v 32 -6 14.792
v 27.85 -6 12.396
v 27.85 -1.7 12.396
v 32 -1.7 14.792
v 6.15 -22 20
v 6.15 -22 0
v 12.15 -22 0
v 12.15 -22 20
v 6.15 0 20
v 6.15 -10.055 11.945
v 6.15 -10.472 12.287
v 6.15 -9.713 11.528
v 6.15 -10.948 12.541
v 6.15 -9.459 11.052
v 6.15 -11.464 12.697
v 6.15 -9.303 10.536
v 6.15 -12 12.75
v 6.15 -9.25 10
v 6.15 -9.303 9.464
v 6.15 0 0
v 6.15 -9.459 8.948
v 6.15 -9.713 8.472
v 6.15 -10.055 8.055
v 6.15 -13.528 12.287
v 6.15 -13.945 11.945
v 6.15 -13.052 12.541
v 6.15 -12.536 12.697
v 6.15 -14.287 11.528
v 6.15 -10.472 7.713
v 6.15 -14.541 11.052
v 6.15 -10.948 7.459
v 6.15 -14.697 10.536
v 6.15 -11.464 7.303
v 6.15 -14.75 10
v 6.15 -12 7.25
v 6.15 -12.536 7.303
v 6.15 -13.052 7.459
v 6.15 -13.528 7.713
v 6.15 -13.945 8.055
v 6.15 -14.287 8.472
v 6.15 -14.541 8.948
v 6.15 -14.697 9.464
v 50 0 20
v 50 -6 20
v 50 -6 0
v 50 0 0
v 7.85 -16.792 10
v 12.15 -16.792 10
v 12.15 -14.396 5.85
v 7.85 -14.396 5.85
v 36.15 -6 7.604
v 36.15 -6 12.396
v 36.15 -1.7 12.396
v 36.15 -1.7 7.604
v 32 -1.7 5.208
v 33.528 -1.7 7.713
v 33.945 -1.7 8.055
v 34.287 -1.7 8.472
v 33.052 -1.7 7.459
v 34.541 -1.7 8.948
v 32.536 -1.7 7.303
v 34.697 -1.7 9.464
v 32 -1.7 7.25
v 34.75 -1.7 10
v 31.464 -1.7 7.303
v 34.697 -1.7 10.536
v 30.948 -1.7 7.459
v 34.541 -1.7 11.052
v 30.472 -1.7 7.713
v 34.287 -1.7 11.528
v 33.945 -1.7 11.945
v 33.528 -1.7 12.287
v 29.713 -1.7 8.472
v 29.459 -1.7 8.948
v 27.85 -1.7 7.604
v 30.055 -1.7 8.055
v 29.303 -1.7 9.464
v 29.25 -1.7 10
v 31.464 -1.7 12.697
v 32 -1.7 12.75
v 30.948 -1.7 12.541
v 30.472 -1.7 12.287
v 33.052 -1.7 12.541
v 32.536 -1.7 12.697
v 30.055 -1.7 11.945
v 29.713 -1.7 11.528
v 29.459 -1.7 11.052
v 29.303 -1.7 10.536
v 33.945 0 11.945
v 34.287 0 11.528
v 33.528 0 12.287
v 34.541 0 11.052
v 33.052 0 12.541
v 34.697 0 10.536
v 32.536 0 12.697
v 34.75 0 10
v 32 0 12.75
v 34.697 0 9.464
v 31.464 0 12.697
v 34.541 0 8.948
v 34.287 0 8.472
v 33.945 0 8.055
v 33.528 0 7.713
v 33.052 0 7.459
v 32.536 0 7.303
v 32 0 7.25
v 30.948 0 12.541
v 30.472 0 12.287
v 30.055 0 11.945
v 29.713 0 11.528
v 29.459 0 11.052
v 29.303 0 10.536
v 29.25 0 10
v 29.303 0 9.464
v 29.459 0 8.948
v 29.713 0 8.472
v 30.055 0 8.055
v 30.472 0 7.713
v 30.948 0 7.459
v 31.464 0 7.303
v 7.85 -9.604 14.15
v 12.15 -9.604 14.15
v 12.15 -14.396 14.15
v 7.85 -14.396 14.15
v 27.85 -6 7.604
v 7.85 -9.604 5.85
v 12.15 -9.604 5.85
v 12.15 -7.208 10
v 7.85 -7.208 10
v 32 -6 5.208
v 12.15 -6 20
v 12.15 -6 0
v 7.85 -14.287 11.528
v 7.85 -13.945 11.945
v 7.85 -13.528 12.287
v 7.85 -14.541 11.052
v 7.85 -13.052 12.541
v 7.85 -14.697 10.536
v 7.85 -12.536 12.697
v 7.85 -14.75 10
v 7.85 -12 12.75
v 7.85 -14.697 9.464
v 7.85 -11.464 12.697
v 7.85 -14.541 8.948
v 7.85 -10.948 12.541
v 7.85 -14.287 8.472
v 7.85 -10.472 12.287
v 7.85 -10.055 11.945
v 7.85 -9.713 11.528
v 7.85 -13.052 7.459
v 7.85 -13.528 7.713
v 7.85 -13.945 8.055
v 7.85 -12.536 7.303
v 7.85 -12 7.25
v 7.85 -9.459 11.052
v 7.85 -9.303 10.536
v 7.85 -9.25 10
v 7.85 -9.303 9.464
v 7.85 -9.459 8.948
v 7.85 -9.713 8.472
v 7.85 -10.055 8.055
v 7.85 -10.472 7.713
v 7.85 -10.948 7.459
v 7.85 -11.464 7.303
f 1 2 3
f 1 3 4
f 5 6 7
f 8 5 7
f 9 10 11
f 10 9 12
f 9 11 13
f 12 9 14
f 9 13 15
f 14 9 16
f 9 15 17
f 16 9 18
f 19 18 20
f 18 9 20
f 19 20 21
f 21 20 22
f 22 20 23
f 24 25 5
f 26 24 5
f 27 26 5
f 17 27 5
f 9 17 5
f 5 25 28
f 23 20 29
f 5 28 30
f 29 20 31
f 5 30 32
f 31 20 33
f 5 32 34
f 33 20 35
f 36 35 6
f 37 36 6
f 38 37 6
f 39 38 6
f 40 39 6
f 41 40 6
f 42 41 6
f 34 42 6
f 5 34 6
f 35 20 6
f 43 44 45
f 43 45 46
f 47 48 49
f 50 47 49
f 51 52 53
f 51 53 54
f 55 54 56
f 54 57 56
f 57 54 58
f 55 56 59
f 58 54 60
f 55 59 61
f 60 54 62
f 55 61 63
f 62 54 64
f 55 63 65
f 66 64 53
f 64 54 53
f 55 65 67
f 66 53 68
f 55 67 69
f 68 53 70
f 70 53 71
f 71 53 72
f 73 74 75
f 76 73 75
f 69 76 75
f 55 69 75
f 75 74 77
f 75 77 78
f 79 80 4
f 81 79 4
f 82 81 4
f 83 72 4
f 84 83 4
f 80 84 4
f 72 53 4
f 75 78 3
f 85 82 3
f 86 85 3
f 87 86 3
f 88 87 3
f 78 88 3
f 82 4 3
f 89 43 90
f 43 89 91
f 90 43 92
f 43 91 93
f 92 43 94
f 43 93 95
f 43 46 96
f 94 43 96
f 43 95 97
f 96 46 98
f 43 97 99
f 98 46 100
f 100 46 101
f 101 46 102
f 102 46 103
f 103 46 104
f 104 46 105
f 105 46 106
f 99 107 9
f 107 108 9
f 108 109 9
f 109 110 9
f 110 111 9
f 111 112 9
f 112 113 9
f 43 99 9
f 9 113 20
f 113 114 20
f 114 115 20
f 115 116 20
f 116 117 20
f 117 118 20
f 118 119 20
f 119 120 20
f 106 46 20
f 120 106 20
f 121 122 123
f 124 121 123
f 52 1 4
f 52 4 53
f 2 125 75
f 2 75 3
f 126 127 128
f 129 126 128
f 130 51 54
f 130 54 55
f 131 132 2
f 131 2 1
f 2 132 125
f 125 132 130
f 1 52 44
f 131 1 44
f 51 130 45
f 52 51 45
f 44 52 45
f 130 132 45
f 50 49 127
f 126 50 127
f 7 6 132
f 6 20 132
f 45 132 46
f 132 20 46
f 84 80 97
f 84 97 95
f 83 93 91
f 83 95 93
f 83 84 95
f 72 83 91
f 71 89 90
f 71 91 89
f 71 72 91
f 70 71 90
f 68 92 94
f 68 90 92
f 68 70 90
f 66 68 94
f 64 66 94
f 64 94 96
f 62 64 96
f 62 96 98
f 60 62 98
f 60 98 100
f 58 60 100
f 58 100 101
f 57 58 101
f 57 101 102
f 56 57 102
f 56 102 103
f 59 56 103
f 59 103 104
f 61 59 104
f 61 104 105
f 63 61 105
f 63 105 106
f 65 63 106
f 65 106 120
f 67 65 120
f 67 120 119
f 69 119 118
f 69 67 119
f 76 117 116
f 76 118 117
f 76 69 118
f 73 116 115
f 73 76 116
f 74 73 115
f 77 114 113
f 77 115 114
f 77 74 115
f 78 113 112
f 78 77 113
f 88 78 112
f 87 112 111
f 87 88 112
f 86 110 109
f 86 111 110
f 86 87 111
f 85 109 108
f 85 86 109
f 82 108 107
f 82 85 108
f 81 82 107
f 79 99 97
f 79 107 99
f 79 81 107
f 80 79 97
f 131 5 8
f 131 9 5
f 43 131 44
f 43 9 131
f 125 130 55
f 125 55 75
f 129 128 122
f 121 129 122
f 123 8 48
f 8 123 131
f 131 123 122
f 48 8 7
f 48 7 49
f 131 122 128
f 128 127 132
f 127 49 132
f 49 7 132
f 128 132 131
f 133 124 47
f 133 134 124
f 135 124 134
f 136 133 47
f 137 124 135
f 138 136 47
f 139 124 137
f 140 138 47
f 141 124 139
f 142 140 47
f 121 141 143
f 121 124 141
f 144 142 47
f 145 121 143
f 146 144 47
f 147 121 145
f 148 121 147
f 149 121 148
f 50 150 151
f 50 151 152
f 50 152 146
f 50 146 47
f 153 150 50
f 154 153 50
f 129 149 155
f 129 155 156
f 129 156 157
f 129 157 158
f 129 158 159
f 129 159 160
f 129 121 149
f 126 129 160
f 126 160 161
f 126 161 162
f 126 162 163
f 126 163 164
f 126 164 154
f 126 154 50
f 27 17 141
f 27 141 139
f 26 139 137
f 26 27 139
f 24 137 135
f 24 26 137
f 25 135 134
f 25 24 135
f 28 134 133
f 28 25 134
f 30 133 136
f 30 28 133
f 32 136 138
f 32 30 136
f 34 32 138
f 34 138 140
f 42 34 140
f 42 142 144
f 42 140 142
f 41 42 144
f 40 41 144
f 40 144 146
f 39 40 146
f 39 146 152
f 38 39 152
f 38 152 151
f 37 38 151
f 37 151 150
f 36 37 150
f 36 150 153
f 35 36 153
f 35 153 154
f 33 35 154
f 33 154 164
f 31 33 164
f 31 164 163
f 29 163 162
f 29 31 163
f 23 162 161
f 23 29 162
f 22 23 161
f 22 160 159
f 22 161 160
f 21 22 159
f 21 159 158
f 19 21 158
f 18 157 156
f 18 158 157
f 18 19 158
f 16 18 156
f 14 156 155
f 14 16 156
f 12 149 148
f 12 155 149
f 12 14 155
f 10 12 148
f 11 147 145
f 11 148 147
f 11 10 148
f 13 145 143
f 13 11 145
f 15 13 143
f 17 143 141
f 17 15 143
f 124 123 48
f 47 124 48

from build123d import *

# Parameters (mm, degrees)
EXTRUDE_20_DEPTH           = 20
CUT_EXTRUDE_5_DEPTH        = 59.172158289
CUT_EXTRUDE_5_DEPTH_BACK   = 59.172158289
SKETCH_5_R                 = 2.75
CUT_EXTRUDE_5_4_3_DEPTH    = 4.3
CUT_EXTRUDE_5_2_DEPTH      = 59.172158289
CUT_EXTRUDE_5_2_DEPTH_BACK = 59.172158289
SKETCH_5_3_R               = 2.75
CUT_EXTRUDE_5_4_3_2_DEPTH  = 4.3


with BuildPart() as part:
    # Профиль_скобы_6мм → Печатный_корпус_20мм (new body)
    with BuildSketch(Plane.XY):
        Polygon((6.15, -22), (12.15, -22), (12.15, -6), (50, -6), (50, 0), (6.15, 0), align=None)
    extrude(amount=EXTRUDE_20_DEPTH)

    # Sketch 5 → Cut-Extrude 5 (cut, two sides: drawn at the far end of the back side and taken through both)
    with BuildSketch(Plane(origin=(0, 0, 0), x_dir=(1, 0, 0), z_dir=(0, 1, 0)).offset(-CUT_EXTRUDE_5_DEPTH_BACK)):
        with Locations(Location((32, -10, 0), (0, 0, 270))):
            Circle(SKETCH_5_R)
    extrude(amount=CUT_EXTRUDE_5_DEPTH + CUT_EXTRUDE_5_DEPTH_BACK, mode=Mode.SUBTRACT)

    # Sketch 5 2 → Cut-Extrude 5_4_3 (cut)
    with BuildSketch(Plane.XZ.offset(6)):
        Polygon((32, 14.792007234), (36.15, 12.396003617), (36.15, 7.603996383), (32, 5.207992766), (27.85, 7.603996383), (27.85, 12.396003617), align=None)
    extrude(amount=-CUT_EXTRUDE_5_4_3_DEPTH, mode=Mode.SUBTRACT)

    # Sketch 5 3 → Cut-Extrude 5 2 (cut, two sides: drawn at the far end of the back side and taken through both)
    with BuildSketch(Plane(origin=(0, 0, 0), x_dir=(0, 0, -1), z_dir=(1, 0, 0)).offset(-CUT_EXTRUDE_5_2_DEPTH_BACK)):
        with Locations(Location((-10, -12, 0), (0, 0, 180))):
            Circle(SKETCH_5_3_R)
    extrude(amount=CUT_EXTRUDE_5_2_DEPTH + CUT_EXTRUDE_5_2_DEPTH_BACK, mode=Mode.SUBTRACT)

    # Sketch 5 4 → Cut-Extrude 5_4_3 2 (cut)
    with BuildSketch(Plane(origin=(12.15, 0, 0), x_dir=(0, 0, -1), z_dir=(1, 0, 0))):
        Polygon((-10, -7.207992766), (-14.15, -9.603996383), (-14.15, -14.396003617), (-10, -16.792007234), (-5.85, -14.396003617), (-5.85, -9.603996383), align=None)
    extrude(amount=-CUT_EXTRUDE_5_4_3_2_DEPTH, mode=Mode.SUBTRACT)


solid = part.part
